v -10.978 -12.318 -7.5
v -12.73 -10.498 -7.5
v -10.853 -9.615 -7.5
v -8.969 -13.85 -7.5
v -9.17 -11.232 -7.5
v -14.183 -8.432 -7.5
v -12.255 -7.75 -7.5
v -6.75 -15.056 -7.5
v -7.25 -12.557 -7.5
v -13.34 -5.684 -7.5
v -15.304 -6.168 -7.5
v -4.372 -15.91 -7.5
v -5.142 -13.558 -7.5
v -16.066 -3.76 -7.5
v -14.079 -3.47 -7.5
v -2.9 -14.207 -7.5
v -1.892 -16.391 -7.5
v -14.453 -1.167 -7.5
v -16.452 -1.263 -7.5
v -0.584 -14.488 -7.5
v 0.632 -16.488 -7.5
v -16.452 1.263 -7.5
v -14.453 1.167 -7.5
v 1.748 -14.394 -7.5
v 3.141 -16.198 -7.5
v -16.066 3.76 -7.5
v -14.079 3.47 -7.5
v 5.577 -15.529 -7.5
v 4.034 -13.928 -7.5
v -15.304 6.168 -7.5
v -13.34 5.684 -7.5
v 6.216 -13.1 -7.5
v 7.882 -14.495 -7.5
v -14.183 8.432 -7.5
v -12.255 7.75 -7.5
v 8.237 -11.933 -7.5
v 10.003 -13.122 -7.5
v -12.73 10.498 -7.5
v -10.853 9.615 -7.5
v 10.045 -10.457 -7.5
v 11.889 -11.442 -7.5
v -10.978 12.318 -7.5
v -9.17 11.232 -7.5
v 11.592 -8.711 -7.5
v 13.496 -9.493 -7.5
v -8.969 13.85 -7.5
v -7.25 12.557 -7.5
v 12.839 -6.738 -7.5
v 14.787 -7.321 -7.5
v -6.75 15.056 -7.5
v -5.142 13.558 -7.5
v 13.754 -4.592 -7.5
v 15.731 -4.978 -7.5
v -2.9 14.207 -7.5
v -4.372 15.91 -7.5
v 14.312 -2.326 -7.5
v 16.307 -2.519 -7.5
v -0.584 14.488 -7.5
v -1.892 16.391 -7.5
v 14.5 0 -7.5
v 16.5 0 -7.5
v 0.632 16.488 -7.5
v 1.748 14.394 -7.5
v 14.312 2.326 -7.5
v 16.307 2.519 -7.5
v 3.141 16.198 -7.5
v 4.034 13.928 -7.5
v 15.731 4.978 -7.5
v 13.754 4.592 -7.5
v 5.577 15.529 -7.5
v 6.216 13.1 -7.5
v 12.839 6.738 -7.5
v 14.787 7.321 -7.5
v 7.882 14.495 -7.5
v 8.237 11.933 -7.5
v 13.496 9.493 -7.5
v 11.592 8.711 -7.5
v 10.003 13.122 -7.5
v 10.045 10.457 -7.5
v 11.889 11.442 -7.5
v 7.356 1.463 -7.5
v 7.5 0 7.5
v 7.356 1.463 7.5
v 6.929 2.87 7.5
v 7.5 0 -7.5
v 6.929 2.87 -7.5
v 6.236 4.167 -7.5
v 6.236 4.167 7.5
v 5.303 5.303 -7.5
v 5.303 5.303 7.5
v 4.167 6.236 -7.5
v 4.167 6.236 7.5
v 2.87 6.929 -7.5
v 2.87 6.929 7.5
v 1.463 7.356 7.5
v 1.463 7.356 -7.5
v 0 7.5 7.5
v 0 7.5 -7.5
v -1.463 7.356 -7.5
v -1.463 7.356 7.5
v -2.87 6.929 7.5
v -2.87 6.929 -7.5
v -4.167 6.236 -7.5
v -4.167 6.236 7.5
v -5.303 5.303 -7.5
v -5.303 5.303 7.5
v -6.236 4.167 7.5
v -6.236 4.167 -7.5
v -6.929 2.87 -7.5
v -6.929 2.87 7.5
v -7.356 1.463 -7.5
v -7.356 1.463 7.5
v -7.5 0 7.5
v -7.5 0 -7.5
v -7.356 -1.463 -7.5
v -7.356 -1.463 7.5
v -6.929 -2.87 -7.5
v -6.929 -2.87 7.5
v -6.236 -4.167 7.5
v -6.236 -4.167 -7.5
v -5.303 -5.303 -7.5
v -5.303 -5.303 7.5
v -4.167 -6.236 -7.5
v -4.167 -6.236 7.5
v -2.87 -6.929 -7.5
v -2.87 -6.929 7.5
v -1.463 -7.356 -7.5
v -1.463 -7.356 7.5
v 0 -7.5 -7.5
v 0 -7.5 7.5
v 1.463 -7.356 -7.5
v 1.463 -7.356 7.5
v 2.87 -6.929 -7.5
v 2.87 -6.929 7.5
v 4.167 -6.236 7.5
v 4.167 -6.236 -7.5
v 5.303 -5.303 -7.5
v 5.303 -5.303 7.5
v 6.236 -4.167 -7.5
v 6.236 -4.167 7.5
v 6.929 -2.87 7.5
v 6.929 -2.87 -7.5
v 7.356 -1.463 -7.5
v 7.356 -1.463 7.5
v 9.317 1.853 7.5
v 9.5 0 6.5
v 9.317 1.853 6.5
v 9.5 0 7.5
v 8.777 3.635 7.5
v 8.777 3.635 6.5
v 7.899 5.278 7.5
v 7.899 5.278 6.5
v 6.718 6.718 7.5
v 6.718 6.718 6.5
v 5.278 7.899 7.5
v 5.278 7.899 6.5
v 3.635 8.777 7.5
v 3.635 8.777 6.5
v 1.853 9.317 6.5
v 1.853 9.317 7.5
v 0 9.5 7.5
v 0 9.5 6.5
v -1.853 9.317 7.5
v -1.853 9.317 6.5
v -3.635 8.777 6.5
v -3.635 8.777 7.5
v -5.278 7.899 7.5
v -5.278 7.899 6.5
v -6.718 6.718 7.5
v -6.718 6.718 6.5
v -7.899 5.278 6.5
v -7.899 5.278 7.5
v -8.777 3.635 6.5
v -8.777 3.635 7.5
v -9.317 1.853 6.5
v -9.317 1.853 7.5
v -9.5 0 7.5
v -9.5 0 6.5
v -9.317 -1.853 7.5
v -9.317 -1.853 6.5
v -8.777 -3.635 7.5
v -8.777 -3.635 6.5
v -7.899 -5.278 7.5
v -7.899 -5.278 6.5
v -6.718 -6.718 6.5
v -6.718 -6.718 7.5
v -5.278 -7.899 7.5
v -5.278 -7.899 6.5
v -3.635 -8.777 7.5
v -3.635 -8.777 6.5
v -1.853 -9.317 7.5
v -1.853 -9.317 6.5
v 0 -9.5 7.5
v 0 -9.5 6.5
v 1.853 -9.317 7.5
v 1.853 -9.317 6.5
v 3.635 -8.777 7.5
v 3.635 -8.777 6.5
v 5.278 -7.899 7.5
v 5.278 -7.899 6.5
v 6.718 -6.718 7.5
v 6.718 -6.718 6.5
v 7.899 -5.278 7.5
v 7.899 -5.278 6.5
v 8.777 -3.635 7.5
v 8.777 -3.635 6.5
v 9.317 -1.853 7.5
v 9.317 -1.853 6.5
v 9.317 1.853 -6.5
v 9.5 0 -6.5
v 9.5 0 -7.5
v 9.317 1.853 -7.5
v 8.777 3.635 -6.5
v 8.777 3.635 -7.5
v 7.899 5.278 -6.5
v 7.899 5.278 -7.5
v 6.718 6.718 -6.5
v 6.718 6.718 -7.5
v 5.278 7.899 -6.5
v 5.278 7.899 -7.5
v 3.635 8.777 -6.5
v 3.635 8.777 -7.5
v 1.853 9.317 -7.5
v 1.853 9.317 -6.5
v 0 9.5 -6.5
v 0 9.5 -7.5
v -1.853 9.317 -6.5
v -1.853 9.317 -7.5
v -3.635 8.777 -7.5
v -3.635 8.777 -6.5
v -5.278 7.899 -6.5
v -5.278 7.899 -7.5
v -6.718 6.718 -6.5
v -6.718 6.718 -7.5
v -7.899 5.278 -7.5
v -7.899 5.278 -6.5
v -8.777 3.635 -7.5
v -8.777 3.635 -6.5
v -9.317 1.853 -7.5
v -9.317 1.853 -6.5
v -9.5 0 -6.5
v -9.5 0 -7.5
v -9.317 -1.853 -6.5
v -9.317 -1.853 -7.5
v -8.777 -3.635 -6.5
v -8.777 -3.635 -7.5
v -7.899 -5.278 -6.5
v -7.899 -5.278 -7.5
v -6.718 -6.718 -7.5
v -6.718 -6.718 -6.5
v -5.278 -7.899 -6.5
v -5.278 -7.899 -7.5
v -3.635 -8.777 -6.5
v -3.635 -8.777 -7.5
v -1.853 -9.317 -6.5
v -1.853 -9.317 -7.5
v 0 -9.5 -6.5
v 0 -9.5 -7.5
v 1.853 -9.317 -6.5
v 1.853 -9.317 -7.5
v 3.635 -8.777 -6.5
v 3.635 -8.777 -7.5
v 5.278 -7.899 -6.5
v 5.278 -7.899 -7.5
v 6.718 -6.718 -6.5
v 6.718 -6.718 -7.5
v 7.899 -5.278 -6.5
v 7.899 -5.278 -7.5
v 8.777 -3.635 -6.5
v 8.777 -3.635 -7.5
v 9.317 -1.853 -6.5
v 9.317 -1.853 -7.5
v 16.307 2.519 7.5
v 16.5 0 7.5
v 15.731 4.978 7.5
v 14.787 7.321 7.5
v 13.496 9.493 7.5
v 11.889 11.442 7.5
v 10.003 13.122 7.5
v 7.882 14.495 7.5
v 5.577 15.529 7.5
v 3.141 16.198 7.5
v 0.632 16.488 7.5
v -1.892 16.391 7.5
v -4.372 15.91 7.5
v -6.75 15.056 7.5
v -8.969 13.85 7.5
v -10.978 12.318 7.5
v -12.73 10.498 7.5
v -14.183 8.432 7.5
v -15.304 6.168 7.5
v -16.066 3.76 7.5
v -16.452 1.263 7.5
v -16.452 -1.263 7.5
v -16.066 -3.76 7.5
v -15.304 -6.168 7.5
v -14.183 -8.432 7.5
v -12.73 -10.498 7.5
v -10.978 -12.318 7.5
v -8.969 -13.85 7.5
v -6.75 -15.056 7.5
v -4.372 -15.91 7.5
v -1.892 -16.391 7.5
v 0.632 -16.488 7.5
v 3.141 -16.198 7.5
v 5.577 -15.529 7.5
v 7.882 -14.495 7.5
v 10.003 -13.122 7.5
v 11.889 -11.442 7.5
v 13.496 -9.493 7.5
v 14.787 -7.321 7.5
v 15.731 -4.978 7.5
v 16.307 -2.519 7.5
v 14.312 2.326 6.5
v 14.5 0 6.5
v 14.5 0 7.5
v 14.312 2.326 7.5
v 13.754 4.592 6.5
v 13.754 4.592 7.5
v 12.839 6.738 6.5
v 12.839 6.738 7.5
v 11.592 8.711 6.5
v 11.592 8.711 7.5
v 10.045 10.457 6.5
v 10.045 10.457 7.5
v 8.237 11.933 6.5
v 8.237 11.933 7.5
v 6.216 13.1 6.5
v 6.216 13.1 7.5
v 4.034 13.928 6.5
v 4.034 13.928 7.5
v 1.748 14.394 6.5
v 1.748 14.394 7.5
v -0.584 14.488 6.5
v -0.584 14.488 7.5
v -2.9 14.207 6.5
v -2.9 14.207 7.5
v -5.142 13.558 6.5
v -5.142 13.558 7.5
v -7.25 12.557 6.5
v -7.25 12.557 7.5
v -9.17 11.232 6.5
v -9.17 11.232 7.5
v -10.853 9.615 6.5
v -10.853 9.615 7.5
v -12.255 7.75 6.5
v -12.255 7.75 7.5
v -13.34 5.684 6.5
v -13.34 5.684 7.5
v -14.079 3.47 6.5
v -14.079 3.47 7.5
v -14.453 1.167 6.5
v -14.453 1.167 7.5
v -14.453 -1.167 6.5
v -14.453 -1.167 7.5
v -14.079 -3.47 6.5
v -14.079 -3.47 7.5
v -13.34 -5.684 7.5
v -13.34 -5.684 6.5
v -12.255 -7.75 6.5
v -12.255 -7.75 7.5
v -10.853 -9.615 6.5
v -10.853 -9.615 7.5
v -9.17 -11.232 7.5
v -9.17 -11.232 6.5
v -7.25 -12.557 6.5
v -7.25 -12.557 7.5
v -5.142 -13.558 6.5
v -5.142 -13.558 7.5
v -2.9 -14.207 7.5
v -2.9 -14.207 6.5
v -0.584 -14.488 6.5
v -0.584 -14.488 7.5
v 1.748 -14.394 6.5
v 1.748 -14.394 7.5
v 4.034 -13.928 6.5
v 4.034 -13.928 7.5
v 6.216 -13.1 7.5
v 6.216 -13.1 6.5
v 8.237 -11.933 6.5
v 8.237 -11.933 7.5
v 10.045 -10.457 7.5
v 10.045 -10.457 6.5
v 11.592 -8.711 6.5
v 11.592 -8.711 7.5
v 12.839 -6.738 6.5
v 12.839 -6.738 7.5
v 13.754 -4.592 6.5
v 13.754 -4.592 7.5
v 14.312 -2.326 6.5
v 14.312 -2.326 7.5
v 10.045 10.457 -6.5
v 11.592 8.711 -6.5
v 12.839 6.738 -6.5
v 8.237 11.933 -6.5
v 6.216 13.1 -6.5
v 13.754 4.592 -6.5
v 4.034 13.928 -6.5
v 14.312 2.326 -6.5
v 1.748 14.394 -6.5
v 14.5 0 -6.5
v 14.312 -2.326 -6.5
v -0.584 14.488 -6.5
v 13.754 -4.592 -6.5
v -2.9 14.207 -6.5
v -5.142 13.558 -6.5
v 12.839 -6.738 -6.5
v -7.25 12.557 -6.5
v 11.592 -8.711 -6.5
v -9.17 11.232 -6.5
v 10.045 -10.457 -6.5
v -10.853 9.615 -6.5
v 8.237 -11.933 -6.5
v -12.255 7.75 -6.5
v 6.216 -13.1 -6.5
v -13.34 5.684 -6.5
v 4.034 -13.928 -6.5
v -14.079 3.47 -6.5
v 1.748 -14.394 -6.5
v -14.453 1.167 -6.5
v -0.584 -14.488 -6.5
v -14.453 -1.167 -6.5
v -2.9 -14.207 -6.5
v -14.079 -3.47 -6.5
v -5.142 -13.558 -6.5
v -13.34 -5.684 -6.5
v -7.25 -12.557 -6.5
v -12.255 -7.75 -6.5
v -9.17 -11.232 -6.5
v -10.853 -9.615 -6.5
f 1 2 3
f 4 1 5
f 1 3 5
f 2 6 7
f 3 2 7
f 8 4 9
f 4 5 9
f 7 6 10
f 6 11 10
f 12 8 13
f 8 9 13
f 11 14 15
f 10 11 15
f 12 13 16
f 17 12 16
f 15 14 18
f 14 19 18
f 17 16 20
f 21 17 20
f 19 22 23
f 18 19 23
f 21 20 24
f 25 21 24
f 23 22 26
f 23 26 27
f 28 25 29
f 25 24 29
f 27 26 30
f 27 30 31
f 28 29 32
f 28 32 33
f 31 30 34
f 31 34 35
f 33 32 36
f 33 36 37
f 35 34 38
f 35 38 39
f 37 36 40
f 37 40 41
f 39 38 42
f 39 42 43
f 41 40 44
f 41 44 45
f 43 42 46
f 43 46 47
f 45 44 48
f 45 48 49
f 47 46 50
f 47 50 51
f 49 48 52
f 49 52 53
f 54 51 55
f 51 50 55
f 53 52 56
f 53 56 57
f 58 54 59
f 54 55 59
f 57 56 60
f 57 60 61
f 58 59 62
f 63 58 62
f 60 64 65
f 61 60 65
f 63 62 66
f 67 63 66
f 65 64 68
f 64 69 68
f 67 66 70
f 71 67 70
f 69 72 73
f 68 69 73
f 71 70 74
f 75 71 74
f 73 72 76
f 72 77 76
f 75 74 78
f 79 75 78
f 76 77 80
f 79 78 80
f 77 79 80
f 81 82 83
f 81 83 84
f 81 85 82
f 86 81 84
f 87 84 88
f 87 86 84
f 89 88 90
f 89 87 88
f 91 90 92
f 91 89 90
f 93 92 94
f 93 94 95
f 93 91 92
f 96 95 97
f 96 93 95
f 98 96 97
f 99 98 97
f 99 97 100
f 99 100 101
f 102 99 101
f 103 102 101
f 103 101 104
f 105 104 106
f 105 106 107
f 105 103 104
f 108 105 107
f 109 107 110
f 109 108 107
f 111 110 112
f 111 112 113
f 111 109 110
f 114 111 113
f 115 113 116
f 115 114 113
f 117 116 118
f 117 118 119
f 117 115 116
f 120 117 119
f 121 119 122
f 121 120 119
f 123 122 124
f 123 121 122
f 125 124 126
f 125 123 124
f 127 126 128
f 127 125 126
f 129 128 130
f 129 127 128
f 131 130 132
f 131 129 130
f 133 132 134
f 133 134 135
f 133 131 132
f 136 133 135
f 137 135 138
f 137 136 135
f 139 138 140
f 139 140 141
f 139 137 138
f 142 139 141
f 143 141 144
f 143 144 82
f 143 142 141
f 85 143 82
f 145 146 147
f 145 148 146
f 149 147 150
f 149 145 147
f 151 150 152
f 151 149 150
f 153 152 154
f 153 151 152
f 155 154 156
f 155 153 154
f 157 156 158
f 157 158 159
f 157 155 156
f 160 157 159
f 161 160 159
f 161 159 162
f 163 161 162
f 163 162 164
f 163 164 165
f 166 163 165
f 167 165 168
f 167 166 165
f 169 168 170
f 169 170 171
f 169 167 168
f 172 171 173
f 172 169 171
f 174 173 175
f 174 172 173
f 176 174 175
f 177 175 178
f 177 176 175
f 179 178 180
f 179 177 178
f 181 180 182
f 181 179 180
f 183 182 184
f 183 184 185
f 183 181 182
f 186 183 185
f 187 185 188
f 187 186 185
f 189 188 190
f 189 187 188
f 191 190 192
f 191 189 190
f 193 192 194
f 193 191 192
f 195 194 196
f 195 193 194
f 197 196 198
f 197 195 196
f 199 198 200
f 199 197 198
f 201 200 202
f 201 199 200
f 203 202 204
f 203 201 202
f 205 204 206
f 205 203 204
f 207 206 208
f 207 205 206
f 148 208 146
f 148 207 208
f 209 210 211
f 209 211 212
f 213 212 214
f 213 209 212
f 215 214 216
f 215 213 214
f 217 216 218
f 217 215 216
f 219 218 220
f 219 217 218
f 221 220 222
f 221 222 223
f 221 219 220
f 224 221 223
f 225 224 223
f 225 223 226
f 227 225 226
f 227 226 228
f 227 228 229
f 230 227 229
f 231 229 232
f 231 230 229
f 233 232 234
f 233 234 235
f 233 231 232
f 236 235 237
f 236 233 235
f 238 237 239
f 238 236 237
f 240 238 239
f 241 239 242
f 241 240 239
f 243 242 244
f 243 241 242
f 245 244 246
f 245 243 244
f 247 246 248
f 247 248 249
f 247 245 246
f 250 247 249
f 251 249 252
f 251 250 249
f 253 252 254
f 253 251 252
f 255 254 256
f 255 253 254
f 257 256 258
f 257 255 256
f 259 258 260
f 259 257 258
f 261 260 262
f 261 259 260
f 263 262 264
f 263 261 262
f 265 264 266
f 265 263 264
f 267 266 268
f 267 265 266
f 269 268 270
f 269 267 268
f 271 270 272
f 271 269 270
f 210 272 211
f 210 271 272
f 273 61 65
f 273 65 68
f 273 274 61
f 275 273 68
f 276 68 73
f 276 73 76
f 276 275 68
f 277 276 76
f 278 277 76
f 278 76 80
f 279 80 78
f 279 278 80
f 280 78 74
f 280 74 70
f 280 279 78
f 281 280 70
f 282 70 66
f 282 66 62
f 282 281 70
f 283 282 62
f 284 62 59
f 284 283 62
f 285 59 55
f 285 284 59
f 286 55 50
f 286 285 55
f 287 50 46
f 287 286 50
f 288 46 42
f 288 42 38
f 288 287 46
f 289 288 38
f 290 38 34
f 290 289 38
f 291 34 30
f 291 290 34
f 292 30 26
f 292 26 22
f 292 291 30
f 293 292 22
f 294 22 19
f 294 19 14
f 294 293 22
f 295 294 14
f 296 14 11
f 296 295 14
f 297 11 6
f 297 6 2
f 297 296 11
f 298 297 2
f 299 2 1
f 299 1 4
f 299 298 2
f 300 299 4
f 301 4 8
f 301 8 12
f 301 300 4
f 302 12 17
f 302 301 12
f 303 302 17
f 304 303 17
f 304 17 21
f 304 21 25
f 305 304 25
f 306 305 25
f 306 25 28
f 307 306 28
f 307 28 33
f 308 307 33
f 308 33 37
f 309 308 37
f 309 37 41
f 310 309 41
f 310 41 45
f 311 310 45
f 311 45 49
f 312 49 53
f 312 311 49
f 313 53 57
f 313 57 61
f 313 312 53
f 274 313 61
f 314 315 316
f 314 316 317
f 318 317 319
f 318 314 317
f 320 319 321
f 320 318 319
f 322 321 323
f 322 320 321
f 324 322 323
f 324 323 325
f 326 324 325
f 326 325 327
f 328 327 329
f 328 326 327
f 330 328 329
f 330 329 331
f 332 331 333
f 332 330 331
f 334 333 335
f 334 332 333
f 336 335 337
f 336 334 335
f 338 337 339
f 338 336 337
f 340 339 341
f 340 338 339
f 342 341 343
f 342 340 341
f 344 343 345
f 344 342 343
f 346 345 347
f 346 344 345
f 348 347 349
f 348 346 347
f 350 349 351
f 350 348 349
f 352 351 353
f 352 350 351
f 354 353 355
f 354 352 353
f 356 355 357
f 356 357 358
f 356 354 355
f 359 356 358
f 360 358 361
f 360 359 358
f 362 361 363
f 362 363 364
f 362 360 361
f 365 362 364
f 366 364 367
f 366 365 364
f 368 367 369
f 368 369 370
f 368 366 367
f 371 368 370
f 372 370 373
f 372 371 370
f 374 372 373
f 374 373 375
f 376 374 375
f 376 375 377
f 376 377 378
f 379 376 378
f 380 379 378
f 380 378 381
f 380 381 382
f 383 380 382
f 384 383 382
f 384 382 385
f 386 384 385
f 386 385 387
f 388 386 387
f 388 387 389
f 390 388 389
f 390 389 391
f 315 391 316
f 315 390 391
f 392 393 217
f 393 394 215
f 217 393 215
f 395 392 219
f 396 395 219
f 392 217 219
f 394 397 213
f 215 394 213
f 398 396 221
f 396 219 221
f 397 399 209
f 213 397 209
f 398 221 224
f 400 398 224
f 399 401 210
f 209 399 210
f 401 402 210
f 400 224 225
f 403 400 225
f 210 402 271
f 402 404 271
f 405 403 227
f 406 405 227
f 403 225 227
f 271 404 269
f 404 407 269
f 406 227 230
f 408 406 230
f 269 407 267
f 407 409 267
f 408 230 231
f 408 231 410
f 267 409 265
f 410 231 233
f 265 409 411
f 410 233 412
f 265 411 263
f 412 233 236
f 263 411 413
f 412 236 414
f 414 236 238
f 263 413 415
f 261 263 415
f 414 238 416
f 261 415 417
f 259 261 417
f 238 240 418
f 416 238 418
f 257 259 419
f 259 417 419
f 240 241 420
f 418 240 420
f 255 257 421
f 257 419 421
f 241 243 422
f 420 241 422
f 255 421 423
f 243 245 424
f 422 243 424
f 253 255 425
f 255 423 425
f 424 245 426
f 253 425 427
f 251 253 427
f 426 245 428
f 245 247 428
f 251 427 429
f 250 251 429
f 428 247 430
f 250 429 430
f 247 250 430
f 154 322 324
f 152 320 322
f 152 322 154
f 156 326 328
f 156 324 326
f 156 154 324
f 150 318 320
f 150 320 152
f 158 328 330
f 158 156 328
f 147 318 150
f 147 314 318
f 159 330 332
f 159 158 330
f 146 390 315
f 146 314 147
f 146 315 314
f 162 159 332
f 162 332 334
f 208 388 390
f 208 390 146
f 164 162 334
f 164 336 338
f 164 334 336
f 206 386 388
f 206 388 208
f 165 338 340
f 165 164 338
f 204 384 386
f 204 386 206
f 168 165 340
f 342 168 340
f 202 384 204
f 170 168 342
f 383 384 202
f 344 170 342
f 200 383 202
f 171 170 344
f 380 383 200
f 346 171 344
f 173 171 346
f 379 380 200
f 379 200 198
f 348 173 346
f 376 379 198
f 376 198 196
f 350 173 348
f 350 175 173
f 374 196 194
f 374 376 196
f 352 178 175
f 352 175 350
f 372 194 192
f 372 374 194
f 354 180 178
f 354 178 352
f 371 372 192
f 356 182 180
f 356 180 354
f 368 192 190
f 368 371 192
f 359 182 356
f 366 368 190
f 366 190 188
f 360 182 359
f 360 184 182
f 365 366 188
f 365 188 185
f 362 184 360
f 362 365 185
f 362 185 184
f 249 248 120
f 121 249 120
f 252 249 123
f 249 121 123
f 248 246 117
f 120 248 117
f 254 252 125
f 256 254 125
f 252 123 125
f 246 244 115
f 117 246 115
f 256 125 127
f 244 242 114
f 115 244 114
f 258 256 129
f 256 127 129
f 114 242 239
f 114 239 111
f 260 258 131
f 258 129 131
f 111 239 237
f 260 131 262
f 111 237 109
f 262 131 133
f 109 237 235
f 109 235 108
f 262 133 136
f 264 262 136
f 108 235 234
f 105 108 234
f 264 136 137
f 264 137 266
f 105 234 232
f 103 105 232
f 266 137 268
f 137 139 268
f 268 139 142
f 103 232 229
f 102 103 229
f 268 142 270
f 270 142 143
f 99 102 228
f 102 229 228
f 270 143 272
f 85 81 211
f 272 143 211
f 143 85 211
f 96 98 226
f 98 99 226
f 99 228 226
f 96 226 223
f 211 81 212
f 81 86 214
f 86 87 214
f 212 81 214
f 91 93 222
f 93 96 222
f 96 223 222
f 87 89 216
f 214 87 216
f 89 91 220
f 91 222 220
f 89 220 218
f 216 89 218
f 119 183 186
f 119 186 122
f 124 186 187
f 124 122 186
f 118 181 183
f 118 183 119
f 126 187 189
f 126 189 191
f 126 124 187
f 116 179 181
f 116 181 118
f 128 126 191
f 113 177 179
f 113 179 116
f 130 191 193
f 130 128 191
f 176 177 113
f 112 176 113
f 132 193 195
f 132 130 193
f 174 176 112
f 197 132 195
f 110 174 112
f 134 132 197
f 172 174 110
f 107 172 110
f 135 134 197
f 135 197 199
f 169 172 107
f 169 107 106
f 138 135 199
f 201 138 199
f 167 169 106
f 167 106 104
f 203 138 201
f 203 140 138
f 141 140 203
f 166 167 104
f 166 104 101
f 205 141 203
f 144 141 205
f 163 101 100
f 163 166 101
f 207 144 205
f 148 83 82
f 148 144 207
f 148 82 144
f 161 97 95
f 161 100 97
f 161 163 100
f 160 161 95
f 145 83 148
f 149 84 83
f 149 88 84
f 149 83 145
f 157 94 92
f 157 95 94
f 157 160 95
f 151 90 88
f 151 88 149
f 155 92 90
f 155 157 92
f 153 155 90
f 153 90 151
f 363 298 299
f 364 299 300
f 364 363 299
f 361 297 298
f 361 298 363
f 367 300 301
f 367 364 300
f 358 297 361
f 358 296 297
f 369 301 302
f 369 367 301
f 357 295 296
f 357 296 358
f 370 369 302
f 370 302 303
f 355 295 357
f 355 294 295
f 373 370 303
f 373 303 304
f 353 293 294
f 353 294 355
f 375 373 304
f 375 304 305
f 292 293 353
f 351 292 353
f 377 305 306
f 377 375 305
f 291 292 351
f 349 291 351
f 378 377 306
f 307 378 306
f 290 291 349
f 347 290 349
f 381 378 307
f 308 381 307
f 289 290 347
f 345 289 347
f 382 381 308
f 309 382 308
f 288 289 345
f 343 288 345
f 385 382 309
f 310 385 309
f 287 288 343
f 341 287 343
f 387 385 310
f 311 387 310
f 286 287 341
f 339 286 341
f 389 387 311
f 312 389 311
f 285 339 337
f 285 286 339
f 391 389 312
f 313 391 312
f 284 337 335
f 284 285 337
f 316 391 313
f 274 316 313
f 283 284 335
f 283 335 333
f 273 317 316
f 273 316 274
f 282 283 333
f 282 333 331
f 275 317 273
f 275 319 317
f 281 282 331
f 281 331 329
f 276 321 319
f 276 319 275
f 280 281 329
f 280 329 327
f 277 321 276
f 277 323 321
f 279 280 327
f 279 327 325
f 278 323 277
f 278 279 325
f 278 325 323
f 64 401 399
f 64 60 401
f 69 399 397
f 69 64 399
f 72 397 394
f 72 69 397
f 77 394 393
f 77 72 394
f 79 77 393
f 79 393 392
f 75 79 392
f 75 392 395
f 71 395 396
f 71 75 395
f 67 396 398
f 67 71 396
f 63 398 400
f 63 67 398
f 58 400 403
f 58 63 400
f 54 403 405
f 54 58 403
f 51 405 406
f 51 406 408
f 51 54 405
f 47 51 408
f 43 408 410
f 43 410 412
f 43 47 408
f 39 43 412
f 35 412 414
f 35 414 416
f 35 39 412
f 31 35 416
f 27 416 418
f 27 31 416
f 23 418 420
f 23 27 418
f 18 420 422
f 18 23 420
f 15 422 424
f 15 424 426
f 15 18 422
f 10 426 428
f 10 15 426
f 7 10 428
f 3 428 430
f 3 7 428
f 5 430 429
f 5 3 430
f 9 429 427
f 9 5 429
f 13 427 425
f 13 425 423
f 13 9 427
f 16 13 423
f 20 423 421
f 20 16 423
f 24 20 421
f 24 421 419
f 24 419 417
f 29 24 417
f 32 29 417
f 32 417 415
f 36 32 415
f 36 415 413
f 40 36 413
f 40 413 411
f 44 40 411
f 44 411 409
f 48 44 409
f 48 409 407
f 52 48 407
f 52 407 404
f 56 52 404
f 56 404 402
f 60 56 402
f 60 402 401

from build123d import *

# Parameters (mm, degrees)
SKETCH1_R           = 9.5
SKETCH1_R_2         = 7.5
BOSS_EXTRUDE1_DEPTH = 7.5
SKETCH4_R           = 14.5
SKETCH4_R_2         = 9.5
BOSS_EXTRUDE2_DEPTH = 6.5
SKETCH5_R           = 16.5
SKETCH5_R_2         = 14.5
BOSS_EXTRUDE3_DEPTH = 7.5


with BuildPart() as part:
    # Sketch1 → Boss-Extrude1 (new, symmetric)
    with BuildSketch(Plane.XY):
        Circle(SKETCH1_R)
        Circle(SKETCH1_R_2, mode=Mode.SUBTRACT)
    extrude(amount=BOSS_EXTRUDE1_DEPTH, both=True)

    # Sketch4 → Boss-Extrude2 (add, symmetric)
    with BuildSketch(Plane.XY):
        with Locations(Location((0, 0, 0), (0, 0, 180))):
            Circle(SKETCH4_R)
        Circle(SKETCH4_R_2, mode=Mode.SUBTRACT)
    extrude(amount=BOSS_EXTRUDE2_DEPTH, both=True)

    # Sketch5 → Boss-Extrude3 (add, symmetric)
    with BuildSketch(Plane.XY):
        Circle(SKETCH5_R)
        Circle(SKETCH5_R_2, mode=Mode.SUBTRACT)
    extrude(amount=BOSS_EXTRUDE3_DEPTH, both=True)


solid = part.part
